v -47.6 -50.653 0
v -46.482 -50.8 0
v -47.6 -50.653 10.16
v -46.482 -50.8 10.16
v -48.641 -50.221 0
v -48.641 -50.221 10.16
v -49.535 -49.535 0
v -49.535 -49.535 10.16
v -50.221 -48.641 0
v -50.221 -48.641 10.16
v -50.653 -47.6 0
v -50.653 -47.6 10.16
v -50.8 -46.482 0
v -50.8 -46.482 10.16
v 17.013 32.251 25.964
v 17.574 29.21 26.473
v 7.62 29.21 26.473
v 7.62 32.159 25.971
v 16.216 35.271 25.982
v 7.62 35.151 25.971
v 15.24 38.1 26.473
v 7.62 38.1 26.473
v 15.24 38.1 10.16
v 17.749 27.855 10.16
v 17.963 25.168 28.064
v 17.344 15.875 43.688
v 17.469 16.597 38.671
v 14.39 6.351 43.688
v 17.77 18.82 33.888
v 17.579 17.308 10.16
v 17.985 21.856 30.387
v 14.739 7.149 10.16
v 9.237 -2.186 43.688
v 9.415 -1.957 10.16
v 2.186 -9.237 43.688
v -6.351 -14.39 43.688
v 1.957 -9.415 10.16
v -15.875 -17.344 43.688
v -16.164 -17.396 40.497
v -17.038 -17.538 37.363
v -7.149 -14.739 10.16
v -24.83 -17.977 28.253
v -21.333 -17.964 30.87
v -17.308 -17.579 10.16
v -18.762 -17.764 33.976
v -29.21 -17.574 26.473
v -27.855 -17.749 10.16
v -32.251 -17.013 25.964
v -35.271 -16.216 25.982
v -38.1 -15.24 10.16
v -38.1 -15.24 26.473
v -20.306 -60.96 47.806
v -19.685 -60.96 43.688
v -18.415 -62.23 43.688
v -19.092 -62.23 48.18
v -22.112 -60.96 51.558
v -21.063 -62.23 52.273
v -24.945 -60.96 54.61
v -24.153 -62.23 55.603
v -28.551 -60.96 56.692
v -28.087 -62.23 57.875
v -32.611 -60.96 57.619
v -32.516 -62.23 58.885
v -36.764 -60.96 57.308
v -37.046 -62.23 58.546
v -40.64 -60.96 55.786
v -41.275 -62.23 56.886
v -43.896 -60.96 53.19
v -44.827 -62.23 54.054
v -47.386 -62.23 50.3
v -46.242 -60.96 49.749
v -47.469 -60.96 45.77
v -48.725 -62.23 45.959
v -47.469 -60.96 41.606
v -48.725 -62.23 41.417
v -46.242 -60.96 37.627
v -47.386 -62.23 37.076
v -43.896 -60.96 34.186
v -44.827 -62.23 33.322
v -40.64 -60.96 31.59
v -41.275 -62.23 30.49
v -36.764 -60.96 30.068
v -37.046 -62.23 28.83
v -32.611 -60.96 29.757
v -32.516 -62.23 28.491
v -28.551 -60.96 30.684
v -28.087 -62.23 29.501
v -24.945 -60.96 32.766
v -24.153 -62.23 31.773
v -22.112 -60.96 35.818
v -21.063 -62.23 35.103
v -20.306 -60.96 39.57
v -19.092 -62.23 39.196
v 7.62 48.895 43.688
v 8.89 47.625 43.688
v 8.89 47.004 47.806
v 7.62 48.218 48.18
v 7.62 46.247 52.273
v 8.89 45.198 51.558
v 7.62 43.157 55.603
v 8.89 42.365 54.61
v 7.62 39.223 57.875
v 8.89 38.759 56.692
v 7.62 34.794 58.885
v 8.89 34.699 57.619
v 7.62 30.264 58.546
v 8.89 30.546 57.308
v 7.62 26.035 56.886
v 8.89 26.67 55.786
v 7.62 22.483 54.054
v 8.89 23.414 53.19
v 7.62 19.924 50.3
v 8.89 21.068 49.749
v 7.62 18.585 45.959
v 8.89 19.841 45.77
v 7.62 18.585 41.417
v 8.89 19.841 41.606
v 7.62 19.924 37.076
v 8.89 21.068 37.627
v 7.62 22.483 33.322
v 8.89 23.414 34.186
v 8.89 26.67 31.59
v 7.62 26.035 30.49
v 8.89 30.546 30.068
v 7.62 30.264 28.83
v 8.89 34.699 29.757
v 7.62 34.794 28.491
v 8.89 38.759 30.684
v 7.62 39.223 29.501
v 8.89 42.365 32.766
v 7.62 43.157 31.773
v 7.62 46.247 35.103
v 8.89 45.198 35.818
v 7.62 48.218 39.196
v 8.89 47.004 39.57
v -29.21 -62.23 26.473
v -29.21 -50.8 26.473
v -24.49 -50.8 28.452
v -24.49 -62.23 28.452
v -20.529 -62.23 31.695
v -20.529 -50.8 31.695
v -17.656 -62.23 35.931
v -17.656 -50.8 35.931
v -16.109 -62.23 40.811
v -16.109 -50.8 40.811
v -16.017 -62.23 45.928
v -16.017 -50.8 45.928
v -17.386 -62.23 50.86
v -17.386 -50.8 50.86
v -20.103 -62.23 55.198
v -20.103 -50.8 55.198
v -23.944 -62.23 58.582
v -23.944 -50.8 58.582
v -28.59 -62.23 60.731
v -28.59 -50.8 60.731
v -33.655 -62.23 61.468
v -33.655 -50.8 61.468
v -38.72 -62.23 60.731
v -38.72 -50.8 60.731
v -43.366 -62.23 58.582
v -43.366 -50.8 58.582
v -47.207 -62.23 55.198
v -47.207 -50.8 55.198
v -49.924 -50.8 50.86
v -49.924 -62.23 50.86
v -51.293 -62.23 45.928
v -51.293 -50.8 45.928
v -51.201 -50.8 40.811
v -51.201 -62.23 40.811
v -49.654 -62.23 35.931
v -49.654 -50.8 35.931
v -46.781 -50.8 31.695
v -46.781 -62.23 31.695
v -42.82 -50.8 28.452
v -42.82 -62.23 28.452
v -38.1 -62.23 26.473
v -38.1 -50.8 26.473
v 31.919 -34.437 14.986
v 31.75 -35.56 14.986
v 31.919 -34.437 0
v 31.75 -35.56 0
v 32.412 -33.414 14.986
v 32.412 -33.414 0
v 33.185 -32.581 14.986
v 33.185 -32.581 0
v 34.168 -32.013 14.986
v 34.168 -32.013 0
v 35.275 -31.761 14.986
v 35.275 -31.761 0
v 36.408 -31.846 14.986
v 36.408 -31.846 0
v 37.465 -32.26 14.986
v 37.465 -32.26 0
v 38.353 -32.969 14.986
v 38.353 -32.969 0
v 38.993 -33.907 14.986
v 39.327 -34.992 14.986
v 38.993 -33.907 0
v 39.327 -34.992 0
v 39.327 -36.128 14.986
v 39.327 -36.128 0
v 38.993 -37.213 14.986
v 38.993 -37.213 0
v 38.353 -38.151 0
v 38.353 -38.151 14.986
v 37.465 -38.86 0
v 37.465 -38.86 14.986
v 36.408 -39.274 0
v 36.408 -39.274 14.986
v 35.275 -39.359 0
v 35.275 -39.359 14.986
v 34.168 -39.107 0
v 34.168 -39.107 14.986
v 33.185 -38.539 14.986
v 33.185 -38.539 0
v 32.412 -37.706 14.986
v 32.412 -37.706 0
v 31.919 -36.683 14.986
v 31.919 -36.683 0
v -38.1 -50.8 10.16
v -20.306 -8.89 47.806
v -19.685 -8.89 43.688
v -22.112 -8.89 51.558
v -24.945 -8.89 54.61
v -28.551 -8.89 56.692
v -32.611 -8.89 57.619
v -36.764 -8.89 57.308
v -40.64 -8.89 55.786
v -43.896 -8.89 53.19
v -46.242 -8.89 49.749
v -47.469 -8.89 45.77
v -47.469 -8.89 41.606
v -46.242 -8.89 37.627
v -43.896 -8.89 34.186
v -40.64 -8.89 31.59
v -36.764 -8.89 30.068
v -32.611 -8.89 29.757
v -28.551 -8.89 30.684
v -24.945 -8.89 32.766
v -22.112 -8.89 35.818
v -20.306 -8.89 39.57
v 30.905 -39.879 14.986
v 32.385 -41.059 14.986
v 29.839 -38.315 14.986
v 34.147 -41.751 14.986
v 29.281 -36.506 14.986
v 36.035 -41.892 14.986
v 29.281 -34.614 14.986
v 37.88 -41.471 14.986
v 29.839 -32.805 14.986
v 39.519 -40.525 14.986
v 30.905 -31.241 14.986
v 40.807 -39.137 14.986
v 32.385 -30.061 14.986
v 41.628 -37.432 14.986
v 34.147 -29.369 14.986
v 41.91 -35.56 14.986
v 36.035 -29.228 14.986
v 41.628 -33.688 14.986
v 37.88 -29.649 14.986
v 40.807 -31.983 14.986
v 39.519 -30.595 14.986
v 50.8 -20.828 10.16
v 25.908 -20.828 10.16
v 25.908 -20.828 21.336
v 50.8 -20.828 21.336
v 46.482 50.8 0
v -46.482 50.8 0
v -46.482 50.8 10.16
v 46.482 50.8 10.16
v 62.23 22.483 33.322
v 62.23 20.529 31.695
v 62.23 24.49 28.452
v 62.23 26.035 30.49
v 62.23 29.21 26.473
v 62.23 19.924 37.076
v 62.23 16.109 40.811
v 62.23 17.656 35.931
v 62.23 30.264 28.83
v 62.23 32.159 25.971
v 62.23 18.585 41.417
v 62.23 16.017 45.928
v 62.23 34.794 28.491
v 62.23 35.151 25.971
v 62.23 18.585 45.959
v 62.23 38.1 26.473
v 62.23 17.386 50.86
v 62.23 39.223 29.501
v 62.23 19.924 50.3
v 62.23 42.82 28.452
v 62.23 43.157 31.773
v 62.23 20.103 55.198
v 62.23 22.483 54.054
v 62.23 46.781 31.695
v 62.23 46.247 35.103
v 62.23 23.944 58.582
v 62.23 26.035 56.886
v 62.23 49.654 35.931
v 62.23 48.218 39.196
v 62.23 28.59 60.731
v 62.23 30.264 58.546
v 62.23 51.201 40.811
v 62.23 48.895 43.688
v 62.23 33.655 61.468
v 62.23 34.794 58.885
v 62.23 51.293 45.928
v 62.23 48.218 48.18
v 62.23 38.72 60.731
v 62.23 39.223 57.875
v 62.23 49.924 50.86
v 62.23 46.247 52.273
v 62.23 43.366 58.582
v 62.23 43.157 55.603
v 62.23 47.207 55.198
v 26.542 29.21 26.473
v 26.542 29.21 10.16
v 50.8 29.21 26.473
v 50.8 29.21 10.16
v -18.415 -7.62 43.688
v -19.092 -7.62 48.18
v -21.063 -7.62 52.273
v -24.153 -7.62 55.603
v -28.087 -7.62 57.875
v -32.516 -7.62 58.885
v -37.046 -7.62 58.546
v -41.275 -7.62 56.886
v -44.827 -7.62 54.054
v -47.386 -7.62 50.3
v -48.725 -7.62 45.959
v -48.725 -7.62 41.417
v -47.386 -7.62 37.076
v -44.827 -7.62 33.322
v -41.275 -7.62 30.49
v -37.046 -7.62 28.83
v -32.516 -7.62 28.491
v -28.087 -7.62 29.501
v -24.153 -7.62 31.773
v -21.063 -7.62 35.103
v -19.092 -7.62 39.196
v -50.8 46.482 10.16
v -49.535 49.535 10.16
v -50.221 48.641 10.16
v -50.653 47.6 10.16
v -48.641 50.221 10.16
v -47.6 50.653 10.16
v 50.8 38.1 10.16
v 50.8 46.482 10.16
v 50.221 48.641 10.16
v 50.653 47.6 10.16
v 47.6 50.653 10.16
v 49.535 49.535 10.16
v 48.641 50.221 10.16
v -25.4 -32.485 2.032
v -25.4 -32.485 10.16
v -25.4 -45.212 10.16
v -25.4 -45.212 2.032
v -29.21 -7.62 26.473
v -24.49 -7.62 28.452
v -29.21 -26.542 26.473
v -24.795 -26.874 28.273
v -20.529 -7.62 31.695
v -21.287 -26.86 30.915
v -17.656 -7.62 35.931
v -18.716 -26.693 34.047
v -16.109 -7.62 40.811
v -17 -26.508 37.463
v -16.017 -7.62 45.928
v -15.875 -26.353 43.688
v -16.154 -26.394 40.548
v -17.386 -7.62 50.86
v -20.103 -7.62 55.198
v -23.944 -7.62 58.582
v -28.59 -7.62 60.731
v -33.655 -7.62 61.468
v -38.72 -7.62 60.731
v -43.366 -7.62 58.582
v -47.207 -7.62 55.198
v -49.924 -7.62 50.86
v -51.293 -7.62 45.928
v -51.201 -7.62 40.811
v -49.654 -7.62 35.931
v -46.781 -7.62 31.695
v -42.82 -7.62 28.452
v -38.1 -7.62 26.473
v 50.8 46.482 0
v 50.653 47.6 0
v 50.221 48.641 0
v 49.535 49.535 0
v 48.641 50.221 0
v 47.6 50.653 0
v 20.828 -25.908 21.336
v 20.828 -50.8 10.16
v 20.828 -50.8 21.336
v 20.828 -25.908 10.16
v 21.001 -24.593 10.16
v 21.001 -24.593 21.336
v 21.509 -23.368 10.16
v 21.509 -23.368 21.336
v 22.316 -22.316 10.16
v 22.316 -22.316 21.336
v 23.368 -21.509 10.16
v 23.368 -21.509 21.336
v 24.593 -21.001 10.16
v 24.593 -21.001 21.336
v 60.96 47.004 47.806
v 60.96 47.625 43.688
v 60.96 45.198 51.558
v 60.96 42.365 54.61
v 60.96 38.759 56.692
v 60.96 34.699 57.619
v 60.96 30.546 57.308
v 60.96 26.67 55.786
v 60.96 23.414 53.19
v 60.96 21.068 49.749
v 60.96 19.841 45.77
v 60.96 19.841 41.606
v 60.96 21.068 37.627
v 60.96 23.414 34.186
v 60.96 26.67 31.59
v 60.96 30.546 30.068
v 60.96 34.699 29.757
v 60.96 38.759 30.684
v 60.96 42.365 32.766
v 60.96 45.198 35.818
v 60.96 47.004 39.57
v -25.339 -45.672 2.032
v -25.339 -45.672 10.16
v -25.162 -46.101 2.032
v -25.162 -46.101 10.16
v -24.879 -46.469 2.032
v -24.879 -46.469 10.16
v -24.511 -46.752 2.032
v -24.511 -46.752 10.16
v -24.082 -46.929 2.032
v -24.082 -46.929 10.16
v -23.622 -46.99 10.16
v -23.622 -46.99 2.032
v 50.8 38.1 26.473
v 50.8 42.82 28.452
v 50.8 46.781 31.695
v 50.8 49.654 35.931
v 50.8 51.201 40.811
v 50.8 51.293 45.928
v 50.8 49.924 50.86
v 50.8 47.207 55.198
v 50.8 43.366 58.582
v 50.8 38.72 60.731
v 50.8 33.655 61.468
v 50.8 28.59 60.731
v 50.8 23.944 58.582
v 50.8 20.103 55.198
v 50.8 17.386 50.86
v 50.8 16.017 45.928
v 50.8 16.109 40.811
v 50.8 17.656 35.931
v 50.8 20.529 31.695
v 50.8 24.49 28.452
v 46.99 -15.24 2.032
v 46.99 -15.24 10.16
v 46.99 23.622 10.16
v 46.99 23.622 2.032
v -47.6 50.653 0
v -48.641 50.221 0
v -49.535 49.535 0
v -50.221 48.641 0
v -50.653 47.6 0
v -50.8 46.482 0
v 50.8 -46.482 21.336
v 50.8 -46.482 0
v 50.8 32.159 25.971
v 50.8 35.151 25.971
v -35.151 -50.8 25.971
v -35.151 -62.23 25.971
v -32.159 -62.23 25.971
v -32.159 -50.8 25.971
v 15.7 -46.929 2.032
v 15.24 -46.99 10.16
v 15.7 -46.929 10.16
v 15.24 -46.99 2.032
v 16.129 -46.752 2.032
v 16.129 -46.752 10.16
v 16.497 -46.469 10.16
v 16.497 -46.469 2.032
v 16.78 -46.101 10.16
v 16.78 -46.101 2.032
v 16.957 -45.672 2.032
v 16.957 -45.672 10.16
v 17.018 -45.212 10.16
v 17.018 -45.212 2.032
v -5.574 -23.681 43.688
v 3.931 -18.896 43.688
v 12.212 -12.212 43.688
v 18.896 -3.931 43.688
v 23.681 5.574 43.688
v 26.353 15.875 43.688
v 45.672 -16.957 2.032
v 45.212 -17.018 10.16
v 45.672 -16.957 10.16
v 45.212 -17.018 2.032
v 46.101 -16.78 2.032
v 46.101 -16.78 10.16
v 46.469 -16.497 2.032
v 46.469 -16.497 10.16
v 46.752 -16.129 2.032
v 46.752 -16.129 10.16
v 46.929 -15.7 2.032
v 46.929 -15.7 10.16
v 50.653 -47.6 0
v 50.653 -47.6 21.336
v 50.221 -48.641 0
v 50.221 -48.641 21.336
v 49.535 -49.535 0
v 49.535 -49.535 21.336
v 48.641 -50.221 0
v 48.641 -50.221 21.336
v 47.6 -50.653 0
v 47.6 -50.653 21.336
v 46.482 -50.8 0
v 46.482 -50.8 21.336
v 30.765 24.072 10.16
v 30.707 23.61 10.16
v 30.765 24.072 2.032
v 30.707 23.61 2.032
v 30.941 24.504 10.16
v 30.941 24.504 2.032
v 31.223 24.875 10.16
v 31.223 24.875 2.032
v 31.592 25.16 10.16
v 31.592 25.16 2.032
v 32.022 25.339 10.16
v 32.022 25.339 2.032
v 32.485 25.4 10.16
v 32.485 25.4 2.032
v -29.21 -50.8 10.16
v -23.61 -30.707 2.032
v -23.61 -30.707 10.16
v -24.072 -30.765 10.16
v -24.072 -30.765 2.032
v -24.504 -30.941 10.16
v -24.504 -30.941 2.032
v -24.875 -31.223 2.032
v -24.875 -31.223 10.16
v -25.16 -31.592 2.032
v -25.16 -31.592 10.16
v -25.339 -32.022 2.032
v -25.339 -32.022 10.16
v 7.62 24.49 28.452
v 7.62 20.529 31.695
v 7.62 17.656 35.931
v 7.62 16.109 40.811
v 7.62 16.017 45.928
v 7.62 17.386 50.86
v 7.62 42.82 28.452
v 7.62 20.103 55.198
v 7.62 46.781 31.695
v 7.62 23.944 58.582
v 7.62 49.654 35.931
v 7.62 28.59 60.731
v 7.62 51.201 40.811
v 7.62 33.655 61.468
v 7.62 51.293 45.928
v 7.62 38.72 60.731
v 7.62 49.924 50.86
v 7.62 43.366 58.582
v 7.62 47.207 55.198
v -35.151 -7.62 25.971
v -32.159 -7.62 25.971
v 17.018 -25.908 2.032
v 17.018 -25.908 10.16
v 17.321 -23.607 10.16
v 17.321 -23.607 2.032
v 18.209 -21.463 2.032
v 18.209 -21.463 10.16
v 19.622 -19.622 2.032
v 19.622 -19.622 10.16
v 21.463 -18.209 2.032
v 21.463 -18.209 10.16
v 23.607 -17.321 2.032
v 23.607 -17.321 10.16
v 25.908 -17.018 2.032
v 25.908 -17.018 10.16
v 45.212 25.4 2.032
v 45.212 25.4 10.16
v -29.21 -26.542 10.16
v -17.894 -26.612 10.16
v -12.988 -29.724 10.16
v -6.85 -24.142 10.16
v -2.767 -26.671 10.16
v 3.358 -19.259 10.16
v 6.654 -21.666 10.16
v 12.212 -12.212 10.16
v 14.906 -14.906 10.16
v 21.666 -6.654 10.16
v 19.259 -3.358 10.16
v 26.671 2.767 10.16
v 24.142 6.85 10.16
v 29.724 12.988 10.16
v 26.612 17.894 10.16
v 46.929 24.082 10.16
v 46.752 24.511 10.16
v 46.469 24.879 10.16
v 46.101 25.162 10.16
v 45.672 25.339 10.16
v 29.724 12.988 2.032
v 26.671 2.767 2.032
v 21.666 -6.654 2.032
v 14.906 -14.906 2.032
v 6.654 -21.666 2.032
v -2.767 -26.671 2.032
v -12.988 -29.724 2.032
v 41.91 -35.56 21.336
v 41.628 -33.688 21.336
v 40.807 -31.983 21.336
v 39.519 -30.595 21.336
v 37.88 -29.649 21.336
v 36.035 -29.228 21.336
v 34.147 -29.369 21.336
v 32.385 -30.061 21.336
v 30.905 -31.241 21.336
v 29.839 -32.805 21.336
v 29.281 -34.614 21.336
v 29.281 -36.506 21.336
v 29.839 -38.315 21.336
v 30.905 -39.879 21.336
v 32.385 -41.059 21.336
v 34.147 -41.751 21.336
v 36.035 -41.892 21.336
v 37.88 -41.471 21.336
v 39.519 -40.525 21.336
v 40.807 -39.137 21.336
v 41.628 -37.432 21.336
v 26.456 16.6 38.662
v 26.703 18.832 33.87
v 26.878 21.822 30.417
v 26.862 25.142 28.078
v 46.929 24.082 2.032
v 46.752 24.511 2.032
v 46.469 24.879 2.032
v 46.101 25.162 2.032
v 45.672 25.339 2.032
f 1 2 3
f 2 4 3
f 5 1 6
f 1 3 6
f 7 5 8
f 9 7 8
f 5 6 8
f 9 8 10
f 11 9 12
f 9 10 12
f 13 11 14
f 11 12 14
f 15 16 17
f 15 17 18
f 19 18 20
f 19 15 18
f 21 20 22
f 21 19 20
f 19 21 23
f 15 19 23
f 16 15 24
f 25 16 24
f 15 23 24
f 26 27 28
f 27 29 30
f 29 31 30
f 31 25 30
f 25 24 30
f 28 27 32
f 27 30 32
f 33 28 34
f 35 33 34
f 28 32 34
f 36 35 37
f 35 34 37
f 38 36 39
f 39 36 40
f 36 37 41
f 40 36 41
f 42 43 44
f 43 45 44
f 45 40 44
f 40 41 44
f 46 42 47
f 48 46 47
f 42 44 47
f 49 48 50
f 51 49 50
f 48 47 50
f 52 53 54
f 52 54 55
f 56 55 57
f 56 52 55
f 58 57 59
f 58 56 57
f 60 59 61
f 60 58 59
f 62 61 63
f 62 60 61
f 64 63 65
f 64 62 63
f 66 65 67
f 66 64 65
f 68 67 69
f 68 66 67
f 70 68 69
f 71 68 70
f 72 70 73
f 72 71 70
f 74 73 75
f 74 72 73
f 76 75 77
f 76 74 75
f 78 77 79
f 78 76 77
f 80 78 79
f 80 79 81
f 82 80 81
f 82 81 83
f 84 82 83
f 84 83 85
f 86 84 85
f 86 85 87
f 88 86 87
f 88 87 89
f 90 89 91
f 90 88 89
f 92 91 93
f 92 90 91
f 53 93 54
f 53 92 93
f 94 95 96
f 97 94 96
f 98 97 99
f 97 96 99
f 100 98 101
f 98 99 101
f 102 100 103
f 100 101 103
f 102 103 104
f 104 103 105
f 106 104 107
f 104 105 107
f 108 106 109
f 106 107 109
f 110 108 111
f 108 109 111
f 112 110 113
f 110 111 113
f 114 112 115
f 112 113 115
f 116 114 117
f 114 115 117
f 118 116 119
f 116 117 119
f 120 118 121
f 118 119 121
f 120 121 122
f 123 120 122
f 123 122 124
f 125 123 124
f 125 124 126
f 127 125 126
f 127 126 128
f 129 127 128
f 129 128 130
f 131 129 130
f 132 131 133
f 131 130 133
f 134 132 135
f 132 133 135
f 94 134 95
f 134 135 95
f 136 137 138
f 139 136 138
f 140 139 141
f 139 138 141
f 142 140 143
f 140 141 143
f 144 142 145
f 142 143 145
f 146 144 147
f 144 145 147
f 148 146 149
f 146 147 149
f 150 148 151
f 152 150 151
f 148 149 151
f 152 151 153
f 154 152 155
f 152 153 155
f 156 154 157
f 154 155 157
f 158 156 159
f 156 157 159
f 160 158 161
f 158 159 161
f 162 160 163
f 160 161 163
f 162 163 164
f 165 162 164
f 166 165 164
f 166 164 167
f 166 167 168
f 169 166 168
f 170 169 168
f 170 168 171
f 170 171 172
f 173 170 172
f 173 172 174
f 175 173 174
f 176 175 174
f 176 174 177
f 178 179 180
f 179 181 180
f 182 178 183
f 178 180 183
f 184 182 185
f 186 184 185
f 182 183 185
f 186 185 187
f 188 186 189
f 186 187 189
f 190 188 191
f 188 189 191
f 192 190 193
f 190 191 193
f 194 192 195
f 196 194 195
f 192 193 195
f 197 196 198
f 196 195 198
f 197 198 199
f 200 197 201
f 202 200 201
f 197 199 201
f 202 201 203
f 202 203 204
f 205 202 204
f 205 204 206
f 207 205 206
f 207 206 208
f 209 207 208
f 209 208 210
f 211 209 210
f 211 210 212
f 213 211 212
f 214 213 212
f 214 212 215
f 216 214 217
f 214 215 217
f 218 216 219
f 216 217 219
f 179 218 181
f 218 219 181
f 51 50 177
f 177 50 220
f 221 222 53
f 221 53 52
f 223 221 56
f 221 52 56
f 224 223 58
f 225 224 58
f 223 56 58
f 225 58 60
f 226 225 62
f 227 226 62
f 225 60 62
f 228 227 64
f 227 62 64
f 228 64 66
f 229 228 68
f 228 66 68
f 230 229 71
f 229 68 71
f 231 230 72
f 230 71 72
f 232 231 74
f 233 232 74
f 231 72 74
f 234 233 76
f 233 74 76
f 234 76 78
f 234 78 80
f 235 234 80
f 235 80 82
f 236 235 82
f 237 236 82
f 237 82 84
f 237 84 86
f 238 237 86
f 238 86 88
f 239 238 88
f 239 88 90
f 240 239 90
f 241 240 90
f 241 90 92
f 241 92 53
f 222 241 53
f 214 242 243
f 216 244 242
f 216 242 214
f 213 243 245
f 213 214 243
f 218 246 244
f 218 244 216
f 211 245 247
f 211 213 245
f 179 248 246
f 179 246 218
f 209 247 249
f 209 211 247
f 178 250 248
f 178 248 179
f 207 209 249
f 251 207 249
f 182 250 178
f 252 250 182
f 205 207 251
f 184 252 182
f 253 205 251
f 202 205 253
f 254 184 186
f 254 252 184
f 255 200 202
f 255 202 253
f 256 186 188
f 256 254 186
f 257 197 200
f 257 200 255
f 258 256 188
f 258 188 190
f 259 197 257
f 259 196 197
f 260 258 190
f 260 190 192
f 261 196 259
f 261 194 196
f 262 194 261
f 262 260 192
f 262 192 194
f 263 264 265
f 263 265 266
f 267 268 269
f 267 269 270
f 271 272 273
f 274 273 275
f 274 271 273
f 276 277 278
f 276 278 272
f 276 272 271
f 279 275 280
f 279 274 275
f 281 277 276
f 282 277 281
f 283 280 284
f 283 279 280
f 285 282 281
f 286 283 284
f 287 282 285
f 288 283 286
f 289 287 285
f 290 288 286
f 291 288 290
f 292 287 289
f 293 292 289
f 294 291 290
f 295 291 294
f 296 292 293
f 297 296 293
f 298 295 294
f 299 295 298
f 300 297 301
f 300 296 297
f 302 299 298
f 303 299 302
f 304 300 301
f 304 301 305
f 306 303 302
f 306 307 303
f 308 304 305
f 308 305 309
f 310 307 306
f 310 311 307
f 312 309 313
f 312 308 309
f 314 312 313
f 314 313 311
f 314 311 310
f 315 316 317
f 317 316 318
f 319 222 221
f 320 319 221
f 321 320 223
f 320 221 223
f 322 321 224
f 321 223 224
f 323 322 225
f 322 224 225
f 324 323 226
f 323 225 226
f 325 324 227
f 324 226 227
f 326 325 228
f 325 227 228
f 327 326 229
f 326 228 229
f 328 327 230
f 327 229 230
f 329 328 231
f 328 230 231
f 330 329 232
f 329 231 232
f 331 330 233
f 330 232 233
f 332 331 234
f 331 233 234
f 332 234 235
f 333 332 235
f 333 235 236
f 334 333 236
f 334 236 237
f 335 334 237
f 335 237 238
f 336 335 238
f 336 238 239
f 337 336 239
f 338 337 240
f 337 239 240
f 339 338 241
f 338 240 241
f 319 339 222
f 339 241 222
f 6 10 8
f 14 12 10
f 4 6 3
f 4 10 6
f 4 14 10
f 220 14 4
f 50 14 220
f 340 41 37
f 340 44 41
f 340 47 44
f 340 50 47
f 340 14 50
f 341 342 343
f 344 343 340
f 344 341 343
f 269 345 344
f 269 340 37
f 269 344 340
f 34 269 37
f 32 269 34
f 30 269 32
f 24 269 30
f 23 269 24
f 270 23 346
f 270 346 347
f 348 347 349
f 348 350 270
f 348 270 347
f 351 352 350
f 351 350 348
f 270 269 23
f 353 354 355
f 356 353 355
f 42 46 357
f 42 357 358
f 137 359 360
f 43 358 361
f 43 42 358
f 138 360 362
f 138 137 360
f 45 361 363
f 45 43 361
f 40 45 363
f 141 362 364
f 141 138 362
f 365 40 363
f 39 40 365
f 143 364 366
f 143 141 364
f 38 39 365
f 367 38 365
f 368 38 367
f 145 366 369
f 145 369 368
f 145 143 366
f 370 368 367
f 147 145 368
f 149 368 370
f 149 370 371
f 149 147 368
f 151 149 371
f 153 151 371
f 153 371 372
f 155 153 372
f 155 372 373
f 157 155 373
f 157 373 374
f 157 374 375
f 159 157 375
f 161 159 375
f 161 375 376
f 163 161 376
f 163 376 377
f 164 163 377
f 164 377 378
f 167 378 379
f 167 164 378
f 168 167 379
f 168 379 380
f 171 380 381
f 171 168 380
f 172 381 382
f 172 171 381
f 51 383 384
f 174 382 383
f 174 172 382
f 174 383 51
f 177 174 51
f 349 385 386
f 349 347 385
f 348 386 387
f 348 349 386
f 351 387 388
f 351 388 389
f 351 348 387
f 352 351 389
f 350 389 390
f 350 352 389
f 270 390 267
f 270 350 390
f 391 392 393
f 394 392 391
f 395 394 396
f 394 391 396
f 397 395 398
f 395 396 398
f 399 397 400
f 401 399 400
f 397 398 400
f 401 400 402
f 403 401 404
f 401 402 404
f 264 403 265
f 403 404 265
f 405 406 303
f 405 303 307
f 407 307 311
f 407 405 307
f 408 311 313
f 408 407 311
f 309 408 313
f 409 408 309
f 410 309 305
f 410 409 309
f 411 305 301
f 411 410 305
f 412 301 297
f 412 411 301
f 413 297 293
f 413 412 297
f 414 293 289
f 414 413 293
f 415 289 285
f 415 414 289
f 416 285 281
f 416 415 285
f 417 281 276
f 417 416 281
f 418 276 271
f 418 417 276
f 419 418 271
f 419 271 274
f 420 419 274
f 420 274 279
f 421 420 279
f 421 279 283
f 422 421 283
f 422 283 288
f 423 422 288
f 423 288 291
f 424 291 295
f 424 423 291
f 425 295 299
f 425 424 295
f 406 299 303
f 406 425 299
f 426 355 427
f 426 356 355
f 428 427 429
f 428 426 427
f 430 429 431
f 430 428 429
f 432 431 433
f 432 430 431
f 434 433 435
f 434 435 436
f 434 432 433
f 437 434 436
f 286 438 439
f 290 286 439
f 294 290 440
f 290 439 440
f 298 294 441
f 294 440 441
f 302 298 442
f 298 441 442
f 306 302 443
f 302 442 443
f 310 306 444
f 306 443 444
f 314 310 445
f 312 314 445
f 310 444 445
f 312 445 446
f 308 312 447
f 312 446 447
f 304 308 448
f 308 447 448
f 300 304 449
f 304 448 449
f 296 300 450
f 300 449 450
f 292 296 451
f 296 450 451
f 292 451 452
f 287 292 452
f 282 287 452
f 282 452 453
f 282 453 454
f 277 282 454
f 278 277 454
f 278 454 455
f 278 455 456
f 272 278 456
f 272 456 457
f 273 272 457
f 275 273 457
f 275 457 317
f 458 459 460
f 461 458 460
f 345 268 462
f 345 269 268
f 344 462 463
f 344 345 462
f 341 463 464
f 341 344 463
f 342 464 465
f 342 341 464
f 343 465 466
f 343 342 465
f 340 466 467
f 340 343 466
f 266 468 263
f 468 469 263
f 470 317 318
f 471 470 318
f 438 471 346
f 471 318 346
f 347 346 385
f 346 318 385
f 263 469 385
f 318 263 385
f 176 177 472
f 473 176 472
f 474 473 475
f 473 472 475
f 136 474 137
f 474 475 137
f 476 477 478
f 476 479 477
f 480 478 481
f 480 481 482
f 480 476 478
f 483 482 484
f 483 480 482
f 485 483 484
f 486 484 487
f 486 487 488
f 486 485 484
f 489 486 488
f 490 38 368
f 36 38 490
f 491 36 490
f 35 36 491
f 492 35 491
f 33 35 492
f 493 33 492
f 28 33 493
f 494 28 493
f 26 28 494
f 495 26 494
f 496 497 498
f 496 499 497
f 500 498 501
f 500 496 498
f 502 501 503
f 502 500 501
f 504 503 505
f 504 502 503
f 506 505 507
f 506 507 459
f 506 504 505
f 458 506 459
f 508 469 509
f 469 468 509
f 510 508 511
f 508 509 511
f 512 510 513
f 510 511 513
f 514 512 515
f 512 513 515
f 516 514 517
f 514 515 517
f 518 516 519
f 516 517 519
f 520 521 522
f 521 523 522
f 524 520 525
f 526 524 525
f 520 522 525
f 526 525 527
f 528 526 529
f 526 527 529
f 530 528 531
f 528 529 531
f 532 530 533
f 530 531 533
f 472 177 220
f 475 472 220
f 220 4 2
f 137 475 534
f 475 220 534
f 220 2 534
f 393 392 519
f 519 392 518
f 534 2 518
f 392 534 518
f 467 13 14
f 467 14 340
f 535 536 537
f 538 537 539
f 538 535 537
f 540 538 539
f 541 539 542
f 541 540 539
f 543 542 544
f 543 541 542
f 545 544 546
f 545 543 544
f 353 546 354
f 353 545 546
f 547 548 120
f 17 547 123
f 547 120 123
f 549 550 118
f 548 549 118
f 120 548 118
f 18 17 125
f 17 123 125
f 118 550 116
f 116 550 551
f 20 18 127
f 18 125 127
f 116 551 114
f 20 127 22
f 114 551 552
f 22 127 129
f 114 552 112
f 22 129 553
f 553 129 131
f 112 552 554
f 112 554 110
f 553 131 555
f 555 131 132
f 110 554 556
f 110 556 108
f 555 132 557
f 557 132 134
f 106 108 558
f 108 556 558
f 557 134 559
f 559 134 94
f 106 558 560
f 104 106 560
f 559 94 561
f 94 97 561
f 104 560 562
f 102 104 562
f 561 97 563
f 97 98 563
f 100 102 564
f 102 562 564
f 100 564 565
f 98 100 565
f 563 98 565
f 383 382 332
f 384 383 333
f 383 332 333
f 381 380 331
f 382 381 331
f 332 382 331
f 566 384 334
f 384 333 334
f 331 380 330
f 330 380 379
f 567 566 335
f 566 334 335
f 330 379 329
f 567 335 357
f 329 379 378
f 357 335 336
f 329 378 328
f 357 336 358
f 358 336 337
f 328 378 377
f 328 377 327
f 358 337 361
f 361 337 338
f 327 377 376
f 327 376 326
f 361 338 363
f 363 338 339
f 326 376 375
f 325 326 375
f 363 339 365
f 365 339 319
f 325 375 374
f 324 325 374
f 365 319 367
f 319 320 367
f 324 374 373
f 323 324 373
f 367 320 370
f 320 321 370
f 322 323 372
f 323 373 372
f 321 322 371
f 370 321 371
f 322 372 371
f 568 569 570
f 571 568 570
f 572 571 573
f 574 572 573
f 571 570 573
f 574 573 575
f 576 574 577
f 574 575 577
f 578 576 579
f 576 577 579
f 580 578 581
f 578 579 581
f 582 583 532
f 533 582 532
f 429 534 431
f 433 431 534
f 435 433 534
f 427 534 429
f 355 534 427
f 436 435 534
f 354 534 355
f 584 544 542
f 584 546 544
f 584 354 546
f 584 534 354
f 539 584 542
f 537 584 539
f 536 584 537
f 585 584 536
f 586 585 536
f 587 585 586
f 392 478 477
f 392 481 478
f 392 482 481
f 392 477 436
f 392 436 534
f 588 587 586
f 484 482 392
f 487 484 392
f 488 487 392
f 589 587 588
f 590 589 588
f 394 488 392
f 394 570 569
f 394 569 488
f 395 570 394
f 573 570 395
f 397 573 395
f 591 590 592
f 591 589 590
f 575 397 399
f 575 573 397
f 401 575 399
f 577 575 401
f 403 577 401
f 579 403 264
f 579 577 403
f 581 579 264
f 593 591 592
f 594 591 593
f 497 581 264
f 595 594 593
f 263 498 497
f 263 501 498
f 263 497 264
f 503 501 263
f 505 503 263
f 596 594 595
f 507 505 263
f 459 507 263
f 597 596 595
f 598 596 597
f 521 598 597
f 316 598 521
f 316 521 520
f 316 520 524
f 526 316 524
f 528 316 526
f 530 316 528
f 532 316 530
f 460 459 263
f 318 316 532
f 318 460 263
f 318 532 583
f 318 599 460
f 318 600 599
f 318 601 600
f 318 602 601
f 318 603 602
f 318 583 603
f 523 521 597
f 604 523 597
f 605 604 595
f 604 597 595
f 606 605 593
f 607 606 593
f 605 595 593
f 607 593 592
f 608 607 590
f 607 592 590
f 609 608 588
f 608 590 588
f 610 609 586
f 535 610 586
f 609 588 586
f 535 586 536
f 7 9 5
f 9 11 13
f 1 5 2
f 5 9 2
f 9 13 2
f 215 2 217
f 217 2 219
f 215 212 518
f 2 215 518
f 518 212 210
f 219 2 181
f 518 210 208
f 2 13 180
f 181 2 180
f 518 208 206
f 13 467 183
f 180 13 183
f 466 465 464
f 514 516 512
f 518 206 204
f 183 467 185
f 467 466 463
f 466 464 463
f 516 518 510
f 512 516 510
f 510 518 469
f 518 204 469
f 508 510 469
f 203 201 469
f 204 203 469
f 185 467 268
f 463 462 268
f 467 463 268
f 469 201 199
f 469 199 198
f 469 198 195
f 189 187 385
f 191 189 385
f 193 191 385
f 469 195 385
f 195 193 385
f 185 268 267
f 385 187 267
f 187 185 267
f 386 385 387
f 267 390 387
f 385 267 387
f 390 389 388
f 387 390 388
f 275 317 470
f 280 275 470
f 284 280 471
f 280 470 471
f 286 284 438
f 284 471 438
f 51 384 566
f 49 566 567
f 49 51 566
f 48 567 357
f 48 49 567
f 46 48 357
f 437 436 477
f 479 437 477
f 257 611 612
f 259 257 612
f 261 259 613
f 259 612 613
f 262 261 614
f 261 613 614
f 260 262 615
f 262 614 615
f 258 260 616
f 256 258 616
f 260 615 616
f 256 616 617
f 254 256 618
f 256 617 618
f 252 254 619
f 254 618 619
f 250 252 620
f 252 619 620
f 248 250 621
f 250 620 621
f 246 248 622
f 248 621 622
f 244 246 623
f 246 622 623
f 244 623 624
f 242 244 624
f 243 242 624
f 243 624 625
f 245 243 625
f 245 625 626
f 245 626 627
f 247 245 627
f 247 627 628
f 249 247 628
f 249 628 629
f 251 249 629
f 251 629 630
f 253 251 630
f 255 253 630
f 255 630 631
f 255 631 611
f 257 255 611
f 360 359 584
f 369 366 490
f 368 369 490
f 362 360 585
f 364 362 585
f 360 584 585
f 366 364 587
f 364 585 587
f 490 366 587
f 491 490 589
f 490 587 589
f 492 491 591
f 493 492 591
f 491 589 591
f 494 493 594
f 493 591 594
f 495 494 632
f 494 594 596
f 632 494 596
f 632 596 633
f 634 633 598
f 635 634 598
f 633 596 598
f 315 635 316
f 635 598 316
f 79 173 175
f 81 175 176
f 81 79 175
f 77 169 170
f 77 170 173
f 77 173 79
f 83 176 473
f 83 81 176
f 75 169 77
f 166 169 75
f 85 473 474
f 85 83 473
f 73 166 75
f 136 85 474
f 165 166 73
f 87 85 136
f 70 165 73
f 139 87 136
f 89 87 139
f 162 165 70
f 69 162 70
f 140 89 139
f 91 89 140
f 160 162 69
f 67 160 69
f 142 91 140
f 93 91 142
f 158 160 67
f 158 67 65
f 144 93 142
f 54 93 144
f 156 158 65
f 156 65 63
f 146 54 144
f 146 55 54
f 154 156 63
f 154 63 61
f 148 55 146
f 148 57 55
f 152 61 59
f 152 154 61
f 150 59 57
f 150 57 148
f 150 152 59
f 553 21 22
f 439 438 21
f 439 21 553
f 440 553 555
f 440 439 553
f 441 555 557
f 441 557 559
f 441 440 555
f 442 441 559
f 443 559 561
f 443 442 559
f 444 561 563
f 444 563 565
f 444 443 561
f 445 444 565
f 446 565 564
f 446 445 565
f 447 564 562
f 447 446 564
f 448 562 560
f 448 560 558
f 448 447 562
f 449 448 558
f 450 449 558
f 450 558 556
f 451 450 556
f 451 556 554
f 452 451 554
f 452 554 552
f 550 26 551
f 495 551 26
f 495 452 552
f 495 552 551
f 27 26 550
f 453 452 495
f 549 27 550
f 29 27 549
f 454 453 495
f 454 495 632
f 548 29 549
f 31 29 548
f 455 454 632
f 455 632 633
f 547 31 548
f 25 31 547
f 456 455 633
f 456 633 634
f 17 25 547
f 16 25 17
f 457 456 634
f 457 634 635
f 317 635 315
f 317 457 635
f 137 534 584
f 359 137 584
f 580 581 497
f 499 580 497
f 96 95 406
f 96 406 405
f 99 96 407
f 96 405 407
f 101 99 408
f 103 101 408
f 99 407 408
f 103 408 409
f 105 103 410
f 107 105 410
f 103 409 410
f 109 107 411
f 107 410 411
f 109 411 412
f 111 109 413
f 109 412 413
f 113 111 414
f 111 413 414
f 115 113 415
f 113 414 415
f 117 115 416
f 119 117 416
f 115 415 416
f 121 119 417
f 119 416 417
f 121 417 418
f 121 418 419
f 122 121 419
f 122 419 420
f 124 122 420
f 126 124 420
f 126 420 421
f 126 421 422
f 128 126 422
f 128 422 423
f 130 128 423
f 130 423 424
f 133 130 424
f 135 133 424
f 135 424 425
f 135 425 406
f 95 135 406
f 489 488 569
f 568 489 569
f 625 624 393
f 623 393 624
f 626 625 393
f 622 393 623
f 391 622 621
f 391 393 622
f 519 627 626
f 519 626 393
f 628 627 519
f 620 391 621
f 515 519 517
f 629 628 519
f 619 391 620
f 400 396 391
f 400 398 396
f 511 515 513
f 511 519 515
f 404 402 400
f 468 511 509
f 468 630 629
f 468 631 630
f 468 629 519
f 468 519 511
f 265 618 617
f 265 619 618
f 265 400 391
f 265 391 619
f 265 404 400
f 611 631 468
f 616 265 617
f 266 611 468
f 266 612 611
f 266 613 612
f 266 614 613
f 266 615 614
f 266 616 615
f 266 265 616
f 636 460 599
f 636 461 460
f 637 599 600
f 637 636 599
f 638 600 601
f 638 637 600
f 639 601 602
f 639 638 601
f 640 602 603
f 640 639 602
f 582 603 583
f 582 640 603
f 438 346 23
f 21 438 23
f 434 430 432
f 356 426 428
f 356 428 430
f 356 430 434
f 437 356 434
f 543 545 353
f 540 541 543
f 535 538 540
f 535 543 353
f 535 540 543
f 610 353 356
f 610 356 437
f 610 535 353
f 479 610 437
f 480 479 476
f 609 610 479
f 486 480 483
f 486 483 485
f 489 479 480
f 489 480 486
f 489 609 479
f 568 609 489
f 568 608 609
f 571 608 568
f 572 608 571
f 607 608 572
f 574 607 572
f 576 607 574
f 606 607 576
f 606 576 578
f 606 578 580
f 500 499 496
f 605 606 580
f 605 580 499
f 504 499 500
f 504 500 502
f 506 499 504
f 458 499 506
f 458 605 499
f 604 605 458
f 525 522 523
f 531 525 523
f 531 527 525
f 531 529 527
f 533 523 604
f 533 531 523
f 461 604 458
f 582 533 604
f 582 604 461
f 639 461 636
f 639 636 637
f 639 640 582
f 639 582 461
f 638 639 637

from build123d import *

# Parameters (mm, degrees)
F0_W            = 101.6
F0_H            = 101.6
F1_DEPTH        = 10.16
F3_DEPTH        = 33.528
F5_DEPTH        = 11.43
F5_DEPTH_BACK   = 43.18
F7_DEPTH        = 11.43
F7_DEPTH_BACK   = 43.18
F8_W            = 29.972
F8_H            = 29.972
F9_DEPTH        = 11.176
F10_R           = 5.08
F12_DEPTH       = 8.128
F14_D           = 7.62
F14_CBORE_D     = 12.7
F14_CBORE_DEPTH = 6.35
F15_R           = 1.778
F16_R           = 13.97
F17_DEPTH       = 86.868
F18_R           = 13.97
F19_DEPTH       = 107.696
F20_SIZE        = 1.27
F21_R           = 4.318


with BuildPart() as f1:
    # F0 (on Top) → F1 (new body)
    with BuildSketch(Plane.XY):
        Rectangle(F0_W, F0_H)
    extrude(amount=F1_DEPTH)

    # F2 (on face) → F3 (join)
    with BuildSketch(Plane.XY.offset(10.16)):
        with BuildLine():
            Line((-38.1, -15.24), (-38.1, -50.8))
            Line((-38.1, -50.8), (-29.2099993676, -50.8))
            Line((-29.2099993676, -50.8), (-29.2099993676, -26.5417011038))
            ThreePointArc((-29.2099993676, -26.5417011038), (12.2116619609, -12.2116619609), (26.5417011038, 29.2099993676))
            Line((26.5417011038, 29.2099993676), (50.8, 29.2099993676))
            Line((50.8, 29.2099993676), (50.8, 38.1))
            Line((50.8, 38.1), (15.24, 38.1))
            ThreePointArc((15.24, 38.1), (5.9254822289, -5.9254822289), (-38.1, -15.24))
        make_face()
    extrude(amount=F3_DEPTH)

    # F4 (on face) → F5 (join, two sides)
    with BuildSketch(Plane.XZ.offset(50.8)) as f5_sk:
        with BuildLine():
            ThreePointArc((-29.2099993676, 26.4725891078), (-19.5986753844, 32.8000182224), (-15.8749996838, 43.688))
            ThreePointArc((-15.8749996838, 43.688), (-44.5429814614, 57.7443242994), (-38.1, 26.4725891078))
            Line((-38.1, 26.4725891078), (-38.1, 43.688))
            Line((-38.1, 43.688), (-29.2099993676, 43.688))
            Line((-29.2099993676, 43.688), (-29.2099993676, 26.4725891078))
        make_face()
        with BuildLine():
            Line((-38.1, 43.688), (-38.1, 26.4725891078))
            ThreePointArc((-38.1, 26.4725891078), (-33.6549996838, 25.908), (-29.2099993676, 26.4725891078))
            Line((-29.2099993676, 26.4725891078), (-29.2099993676, 43.688))
            Line((-29.2099993676, 43.688), (-38.1, 43.688))
        make_face()
    extrude(amount=F5_DEPTH)
    extrude(f5_sk.sketch, amount=-F5_DEPTH_BACK)

    # F6 (on face) → F7 (join, two sides)
    with BuildSketch(Plane.YZ.offset(50.8)) as f7_sk:
        with BuildLine():
            ThreePointArc((38.1, 26.4725891078), (47.7113239832, 32.8000182224), (51.4349996838, 43.688))
            ThreePointArc((51.4349996838, 43.688), (22.7670179062, 57.7443242994), (29.2099993676, 26.4725891078))
            Line((29.2099993676, 26.4725891078), (29.2099993676, 43.688))
            Line((29.2099993676, 43.688), (38.1, 43.688))
            Line((38.1, 43.688), (38.1, 26.4725891078))
        make_face()
        with BuildLine():
            Line((29.2099993676, 43.688), (29.2099993676, 26.4725891078))
            ThreePointArc((29.2099993676, 26.4725891078), (33.6549996838, 25.908), (38.1, 26.4725891078))
            Line((38.1, 26.4725891078), (38.1, 43.688))
            Line((38.1, 43.688), (29.2099993676, 43.688))
        make_face()
    extrude(amount=F7_DEPTH)
    extrude(f7_sk.sketch, amount=-F7_DEPTH_BACK)

    # F8 (on face) → F9 (join)
    with BuildSketch(Plane.XY.offset(10.16)):
        with Locations((35.814, -35.814)):
            Rectangle(F8_W, F8_H)
    extrude(amount=F9_DEPTH)

    # F10
    f10_edges = [f1.edges().sort_by_distance(p)[0] for p in [
        (20.828, -20.828, 15.748),
    ]]
    fillet(f10_edges, radius=F10_R)

    # F11 (on face) → F12 (cut)
    with BuildSketch(Plane.XY.offset(10.16)):
        with BuildLine():
            ThreePointArc((30.6647931111, 25.3999990791), (14.9057390012, -14.9057390012), (-25.3999990791, -30.6647931111))
            Line((-25.3999990791, -30.6647931111), (-25.3999990791, -46.9899997115))
            Line((-25.3999990791, -46.9899997115), (17.0179997115, -46.9899997115))
            Line((17.0179997115, -46.9899997115), (17.0179997115, -25.908))
            ThreePointArc((17.0179997115, -25.908), (19.6218205113, -19.6218205113), (25.908, -17.0179997115))
            Line((25.908, -17.0179997115), (46.9899997115, -17.0179997115))
            Line((46.9899997115, -17.0179997115), (46.9899997115, 25.3999990791))
            Line((46.9899997115, 25.3999990791), (30.6647931111, 25.3999990791))
        make_face()
    extrude(amount=-F12_DEPTH, mode=Mode.SUBTRACT)

    # F14 (through all)
    with Locations(Plane.XY.offset(21.336)):
        with Locations((35.56, -35.56)):
            CounterBoreHole(F14_D / 2, F14_CBORE_D / 2, F14_CBORE_DEPTH)

    # F15
    f15_edges = [f1.edges().sort_by_distance(p)[0] for p in [
        (-25.399999, -46.99, 6.096),
        (-25.399999, -30.664793, 6.096),
        (30.664793, 25.399999, 6.096),
        (46.99, 25.399999, 6.096),
        (46.99, -17.018, 6.096),
        (17.018, -46.99, 6.096),
    ]]
    fillet(f15_edges, radius=F15_R)

    # F16 (on face) → F17 (cut)
    with BuildSketch(Plane.XZ.offset(62.23)):
        with Locations((-33.6549996838, 43.688)):
            Circle(F16_R)
    extrude(amount=-F17_DEPTH, mode=Mode.SUBTRACT)

    # F18 (on face) → F19 (cut)
    with BuildSketch(Plane.YZ.offset(62.23)):
        with Locations((33.6549996838, 43.688)):
            Circle(F18_R)
    extrude(amount=-F19_DEPTH, mode=Mode.SUBTRACT)

    # F20
    f20_edges = [f1.edges().sort_by_distance(p)[0] for p in [
        (62.23, 19.685, 43.688),
        (-47.625, -62.23, 43.688),
        (7.62, 19.685, 43.688),
        (-47.625, -7.62, 43.688),
    ]]
    chamfer(f20_edges, length=F20_SIZE)

    # F21
    f21_edges = [f1.edges().sort_by_distance(p)[0] for p in [
        (50.8, -50.8, 10.668),
        (50.8, 50.8, 5.08),
        (-50.8, 50.8, 5.08),
        (-50.8, -50.8, 5.08),
    ]]
    fillet(f21_edges, radius=F21_R)


solid = f1.part
